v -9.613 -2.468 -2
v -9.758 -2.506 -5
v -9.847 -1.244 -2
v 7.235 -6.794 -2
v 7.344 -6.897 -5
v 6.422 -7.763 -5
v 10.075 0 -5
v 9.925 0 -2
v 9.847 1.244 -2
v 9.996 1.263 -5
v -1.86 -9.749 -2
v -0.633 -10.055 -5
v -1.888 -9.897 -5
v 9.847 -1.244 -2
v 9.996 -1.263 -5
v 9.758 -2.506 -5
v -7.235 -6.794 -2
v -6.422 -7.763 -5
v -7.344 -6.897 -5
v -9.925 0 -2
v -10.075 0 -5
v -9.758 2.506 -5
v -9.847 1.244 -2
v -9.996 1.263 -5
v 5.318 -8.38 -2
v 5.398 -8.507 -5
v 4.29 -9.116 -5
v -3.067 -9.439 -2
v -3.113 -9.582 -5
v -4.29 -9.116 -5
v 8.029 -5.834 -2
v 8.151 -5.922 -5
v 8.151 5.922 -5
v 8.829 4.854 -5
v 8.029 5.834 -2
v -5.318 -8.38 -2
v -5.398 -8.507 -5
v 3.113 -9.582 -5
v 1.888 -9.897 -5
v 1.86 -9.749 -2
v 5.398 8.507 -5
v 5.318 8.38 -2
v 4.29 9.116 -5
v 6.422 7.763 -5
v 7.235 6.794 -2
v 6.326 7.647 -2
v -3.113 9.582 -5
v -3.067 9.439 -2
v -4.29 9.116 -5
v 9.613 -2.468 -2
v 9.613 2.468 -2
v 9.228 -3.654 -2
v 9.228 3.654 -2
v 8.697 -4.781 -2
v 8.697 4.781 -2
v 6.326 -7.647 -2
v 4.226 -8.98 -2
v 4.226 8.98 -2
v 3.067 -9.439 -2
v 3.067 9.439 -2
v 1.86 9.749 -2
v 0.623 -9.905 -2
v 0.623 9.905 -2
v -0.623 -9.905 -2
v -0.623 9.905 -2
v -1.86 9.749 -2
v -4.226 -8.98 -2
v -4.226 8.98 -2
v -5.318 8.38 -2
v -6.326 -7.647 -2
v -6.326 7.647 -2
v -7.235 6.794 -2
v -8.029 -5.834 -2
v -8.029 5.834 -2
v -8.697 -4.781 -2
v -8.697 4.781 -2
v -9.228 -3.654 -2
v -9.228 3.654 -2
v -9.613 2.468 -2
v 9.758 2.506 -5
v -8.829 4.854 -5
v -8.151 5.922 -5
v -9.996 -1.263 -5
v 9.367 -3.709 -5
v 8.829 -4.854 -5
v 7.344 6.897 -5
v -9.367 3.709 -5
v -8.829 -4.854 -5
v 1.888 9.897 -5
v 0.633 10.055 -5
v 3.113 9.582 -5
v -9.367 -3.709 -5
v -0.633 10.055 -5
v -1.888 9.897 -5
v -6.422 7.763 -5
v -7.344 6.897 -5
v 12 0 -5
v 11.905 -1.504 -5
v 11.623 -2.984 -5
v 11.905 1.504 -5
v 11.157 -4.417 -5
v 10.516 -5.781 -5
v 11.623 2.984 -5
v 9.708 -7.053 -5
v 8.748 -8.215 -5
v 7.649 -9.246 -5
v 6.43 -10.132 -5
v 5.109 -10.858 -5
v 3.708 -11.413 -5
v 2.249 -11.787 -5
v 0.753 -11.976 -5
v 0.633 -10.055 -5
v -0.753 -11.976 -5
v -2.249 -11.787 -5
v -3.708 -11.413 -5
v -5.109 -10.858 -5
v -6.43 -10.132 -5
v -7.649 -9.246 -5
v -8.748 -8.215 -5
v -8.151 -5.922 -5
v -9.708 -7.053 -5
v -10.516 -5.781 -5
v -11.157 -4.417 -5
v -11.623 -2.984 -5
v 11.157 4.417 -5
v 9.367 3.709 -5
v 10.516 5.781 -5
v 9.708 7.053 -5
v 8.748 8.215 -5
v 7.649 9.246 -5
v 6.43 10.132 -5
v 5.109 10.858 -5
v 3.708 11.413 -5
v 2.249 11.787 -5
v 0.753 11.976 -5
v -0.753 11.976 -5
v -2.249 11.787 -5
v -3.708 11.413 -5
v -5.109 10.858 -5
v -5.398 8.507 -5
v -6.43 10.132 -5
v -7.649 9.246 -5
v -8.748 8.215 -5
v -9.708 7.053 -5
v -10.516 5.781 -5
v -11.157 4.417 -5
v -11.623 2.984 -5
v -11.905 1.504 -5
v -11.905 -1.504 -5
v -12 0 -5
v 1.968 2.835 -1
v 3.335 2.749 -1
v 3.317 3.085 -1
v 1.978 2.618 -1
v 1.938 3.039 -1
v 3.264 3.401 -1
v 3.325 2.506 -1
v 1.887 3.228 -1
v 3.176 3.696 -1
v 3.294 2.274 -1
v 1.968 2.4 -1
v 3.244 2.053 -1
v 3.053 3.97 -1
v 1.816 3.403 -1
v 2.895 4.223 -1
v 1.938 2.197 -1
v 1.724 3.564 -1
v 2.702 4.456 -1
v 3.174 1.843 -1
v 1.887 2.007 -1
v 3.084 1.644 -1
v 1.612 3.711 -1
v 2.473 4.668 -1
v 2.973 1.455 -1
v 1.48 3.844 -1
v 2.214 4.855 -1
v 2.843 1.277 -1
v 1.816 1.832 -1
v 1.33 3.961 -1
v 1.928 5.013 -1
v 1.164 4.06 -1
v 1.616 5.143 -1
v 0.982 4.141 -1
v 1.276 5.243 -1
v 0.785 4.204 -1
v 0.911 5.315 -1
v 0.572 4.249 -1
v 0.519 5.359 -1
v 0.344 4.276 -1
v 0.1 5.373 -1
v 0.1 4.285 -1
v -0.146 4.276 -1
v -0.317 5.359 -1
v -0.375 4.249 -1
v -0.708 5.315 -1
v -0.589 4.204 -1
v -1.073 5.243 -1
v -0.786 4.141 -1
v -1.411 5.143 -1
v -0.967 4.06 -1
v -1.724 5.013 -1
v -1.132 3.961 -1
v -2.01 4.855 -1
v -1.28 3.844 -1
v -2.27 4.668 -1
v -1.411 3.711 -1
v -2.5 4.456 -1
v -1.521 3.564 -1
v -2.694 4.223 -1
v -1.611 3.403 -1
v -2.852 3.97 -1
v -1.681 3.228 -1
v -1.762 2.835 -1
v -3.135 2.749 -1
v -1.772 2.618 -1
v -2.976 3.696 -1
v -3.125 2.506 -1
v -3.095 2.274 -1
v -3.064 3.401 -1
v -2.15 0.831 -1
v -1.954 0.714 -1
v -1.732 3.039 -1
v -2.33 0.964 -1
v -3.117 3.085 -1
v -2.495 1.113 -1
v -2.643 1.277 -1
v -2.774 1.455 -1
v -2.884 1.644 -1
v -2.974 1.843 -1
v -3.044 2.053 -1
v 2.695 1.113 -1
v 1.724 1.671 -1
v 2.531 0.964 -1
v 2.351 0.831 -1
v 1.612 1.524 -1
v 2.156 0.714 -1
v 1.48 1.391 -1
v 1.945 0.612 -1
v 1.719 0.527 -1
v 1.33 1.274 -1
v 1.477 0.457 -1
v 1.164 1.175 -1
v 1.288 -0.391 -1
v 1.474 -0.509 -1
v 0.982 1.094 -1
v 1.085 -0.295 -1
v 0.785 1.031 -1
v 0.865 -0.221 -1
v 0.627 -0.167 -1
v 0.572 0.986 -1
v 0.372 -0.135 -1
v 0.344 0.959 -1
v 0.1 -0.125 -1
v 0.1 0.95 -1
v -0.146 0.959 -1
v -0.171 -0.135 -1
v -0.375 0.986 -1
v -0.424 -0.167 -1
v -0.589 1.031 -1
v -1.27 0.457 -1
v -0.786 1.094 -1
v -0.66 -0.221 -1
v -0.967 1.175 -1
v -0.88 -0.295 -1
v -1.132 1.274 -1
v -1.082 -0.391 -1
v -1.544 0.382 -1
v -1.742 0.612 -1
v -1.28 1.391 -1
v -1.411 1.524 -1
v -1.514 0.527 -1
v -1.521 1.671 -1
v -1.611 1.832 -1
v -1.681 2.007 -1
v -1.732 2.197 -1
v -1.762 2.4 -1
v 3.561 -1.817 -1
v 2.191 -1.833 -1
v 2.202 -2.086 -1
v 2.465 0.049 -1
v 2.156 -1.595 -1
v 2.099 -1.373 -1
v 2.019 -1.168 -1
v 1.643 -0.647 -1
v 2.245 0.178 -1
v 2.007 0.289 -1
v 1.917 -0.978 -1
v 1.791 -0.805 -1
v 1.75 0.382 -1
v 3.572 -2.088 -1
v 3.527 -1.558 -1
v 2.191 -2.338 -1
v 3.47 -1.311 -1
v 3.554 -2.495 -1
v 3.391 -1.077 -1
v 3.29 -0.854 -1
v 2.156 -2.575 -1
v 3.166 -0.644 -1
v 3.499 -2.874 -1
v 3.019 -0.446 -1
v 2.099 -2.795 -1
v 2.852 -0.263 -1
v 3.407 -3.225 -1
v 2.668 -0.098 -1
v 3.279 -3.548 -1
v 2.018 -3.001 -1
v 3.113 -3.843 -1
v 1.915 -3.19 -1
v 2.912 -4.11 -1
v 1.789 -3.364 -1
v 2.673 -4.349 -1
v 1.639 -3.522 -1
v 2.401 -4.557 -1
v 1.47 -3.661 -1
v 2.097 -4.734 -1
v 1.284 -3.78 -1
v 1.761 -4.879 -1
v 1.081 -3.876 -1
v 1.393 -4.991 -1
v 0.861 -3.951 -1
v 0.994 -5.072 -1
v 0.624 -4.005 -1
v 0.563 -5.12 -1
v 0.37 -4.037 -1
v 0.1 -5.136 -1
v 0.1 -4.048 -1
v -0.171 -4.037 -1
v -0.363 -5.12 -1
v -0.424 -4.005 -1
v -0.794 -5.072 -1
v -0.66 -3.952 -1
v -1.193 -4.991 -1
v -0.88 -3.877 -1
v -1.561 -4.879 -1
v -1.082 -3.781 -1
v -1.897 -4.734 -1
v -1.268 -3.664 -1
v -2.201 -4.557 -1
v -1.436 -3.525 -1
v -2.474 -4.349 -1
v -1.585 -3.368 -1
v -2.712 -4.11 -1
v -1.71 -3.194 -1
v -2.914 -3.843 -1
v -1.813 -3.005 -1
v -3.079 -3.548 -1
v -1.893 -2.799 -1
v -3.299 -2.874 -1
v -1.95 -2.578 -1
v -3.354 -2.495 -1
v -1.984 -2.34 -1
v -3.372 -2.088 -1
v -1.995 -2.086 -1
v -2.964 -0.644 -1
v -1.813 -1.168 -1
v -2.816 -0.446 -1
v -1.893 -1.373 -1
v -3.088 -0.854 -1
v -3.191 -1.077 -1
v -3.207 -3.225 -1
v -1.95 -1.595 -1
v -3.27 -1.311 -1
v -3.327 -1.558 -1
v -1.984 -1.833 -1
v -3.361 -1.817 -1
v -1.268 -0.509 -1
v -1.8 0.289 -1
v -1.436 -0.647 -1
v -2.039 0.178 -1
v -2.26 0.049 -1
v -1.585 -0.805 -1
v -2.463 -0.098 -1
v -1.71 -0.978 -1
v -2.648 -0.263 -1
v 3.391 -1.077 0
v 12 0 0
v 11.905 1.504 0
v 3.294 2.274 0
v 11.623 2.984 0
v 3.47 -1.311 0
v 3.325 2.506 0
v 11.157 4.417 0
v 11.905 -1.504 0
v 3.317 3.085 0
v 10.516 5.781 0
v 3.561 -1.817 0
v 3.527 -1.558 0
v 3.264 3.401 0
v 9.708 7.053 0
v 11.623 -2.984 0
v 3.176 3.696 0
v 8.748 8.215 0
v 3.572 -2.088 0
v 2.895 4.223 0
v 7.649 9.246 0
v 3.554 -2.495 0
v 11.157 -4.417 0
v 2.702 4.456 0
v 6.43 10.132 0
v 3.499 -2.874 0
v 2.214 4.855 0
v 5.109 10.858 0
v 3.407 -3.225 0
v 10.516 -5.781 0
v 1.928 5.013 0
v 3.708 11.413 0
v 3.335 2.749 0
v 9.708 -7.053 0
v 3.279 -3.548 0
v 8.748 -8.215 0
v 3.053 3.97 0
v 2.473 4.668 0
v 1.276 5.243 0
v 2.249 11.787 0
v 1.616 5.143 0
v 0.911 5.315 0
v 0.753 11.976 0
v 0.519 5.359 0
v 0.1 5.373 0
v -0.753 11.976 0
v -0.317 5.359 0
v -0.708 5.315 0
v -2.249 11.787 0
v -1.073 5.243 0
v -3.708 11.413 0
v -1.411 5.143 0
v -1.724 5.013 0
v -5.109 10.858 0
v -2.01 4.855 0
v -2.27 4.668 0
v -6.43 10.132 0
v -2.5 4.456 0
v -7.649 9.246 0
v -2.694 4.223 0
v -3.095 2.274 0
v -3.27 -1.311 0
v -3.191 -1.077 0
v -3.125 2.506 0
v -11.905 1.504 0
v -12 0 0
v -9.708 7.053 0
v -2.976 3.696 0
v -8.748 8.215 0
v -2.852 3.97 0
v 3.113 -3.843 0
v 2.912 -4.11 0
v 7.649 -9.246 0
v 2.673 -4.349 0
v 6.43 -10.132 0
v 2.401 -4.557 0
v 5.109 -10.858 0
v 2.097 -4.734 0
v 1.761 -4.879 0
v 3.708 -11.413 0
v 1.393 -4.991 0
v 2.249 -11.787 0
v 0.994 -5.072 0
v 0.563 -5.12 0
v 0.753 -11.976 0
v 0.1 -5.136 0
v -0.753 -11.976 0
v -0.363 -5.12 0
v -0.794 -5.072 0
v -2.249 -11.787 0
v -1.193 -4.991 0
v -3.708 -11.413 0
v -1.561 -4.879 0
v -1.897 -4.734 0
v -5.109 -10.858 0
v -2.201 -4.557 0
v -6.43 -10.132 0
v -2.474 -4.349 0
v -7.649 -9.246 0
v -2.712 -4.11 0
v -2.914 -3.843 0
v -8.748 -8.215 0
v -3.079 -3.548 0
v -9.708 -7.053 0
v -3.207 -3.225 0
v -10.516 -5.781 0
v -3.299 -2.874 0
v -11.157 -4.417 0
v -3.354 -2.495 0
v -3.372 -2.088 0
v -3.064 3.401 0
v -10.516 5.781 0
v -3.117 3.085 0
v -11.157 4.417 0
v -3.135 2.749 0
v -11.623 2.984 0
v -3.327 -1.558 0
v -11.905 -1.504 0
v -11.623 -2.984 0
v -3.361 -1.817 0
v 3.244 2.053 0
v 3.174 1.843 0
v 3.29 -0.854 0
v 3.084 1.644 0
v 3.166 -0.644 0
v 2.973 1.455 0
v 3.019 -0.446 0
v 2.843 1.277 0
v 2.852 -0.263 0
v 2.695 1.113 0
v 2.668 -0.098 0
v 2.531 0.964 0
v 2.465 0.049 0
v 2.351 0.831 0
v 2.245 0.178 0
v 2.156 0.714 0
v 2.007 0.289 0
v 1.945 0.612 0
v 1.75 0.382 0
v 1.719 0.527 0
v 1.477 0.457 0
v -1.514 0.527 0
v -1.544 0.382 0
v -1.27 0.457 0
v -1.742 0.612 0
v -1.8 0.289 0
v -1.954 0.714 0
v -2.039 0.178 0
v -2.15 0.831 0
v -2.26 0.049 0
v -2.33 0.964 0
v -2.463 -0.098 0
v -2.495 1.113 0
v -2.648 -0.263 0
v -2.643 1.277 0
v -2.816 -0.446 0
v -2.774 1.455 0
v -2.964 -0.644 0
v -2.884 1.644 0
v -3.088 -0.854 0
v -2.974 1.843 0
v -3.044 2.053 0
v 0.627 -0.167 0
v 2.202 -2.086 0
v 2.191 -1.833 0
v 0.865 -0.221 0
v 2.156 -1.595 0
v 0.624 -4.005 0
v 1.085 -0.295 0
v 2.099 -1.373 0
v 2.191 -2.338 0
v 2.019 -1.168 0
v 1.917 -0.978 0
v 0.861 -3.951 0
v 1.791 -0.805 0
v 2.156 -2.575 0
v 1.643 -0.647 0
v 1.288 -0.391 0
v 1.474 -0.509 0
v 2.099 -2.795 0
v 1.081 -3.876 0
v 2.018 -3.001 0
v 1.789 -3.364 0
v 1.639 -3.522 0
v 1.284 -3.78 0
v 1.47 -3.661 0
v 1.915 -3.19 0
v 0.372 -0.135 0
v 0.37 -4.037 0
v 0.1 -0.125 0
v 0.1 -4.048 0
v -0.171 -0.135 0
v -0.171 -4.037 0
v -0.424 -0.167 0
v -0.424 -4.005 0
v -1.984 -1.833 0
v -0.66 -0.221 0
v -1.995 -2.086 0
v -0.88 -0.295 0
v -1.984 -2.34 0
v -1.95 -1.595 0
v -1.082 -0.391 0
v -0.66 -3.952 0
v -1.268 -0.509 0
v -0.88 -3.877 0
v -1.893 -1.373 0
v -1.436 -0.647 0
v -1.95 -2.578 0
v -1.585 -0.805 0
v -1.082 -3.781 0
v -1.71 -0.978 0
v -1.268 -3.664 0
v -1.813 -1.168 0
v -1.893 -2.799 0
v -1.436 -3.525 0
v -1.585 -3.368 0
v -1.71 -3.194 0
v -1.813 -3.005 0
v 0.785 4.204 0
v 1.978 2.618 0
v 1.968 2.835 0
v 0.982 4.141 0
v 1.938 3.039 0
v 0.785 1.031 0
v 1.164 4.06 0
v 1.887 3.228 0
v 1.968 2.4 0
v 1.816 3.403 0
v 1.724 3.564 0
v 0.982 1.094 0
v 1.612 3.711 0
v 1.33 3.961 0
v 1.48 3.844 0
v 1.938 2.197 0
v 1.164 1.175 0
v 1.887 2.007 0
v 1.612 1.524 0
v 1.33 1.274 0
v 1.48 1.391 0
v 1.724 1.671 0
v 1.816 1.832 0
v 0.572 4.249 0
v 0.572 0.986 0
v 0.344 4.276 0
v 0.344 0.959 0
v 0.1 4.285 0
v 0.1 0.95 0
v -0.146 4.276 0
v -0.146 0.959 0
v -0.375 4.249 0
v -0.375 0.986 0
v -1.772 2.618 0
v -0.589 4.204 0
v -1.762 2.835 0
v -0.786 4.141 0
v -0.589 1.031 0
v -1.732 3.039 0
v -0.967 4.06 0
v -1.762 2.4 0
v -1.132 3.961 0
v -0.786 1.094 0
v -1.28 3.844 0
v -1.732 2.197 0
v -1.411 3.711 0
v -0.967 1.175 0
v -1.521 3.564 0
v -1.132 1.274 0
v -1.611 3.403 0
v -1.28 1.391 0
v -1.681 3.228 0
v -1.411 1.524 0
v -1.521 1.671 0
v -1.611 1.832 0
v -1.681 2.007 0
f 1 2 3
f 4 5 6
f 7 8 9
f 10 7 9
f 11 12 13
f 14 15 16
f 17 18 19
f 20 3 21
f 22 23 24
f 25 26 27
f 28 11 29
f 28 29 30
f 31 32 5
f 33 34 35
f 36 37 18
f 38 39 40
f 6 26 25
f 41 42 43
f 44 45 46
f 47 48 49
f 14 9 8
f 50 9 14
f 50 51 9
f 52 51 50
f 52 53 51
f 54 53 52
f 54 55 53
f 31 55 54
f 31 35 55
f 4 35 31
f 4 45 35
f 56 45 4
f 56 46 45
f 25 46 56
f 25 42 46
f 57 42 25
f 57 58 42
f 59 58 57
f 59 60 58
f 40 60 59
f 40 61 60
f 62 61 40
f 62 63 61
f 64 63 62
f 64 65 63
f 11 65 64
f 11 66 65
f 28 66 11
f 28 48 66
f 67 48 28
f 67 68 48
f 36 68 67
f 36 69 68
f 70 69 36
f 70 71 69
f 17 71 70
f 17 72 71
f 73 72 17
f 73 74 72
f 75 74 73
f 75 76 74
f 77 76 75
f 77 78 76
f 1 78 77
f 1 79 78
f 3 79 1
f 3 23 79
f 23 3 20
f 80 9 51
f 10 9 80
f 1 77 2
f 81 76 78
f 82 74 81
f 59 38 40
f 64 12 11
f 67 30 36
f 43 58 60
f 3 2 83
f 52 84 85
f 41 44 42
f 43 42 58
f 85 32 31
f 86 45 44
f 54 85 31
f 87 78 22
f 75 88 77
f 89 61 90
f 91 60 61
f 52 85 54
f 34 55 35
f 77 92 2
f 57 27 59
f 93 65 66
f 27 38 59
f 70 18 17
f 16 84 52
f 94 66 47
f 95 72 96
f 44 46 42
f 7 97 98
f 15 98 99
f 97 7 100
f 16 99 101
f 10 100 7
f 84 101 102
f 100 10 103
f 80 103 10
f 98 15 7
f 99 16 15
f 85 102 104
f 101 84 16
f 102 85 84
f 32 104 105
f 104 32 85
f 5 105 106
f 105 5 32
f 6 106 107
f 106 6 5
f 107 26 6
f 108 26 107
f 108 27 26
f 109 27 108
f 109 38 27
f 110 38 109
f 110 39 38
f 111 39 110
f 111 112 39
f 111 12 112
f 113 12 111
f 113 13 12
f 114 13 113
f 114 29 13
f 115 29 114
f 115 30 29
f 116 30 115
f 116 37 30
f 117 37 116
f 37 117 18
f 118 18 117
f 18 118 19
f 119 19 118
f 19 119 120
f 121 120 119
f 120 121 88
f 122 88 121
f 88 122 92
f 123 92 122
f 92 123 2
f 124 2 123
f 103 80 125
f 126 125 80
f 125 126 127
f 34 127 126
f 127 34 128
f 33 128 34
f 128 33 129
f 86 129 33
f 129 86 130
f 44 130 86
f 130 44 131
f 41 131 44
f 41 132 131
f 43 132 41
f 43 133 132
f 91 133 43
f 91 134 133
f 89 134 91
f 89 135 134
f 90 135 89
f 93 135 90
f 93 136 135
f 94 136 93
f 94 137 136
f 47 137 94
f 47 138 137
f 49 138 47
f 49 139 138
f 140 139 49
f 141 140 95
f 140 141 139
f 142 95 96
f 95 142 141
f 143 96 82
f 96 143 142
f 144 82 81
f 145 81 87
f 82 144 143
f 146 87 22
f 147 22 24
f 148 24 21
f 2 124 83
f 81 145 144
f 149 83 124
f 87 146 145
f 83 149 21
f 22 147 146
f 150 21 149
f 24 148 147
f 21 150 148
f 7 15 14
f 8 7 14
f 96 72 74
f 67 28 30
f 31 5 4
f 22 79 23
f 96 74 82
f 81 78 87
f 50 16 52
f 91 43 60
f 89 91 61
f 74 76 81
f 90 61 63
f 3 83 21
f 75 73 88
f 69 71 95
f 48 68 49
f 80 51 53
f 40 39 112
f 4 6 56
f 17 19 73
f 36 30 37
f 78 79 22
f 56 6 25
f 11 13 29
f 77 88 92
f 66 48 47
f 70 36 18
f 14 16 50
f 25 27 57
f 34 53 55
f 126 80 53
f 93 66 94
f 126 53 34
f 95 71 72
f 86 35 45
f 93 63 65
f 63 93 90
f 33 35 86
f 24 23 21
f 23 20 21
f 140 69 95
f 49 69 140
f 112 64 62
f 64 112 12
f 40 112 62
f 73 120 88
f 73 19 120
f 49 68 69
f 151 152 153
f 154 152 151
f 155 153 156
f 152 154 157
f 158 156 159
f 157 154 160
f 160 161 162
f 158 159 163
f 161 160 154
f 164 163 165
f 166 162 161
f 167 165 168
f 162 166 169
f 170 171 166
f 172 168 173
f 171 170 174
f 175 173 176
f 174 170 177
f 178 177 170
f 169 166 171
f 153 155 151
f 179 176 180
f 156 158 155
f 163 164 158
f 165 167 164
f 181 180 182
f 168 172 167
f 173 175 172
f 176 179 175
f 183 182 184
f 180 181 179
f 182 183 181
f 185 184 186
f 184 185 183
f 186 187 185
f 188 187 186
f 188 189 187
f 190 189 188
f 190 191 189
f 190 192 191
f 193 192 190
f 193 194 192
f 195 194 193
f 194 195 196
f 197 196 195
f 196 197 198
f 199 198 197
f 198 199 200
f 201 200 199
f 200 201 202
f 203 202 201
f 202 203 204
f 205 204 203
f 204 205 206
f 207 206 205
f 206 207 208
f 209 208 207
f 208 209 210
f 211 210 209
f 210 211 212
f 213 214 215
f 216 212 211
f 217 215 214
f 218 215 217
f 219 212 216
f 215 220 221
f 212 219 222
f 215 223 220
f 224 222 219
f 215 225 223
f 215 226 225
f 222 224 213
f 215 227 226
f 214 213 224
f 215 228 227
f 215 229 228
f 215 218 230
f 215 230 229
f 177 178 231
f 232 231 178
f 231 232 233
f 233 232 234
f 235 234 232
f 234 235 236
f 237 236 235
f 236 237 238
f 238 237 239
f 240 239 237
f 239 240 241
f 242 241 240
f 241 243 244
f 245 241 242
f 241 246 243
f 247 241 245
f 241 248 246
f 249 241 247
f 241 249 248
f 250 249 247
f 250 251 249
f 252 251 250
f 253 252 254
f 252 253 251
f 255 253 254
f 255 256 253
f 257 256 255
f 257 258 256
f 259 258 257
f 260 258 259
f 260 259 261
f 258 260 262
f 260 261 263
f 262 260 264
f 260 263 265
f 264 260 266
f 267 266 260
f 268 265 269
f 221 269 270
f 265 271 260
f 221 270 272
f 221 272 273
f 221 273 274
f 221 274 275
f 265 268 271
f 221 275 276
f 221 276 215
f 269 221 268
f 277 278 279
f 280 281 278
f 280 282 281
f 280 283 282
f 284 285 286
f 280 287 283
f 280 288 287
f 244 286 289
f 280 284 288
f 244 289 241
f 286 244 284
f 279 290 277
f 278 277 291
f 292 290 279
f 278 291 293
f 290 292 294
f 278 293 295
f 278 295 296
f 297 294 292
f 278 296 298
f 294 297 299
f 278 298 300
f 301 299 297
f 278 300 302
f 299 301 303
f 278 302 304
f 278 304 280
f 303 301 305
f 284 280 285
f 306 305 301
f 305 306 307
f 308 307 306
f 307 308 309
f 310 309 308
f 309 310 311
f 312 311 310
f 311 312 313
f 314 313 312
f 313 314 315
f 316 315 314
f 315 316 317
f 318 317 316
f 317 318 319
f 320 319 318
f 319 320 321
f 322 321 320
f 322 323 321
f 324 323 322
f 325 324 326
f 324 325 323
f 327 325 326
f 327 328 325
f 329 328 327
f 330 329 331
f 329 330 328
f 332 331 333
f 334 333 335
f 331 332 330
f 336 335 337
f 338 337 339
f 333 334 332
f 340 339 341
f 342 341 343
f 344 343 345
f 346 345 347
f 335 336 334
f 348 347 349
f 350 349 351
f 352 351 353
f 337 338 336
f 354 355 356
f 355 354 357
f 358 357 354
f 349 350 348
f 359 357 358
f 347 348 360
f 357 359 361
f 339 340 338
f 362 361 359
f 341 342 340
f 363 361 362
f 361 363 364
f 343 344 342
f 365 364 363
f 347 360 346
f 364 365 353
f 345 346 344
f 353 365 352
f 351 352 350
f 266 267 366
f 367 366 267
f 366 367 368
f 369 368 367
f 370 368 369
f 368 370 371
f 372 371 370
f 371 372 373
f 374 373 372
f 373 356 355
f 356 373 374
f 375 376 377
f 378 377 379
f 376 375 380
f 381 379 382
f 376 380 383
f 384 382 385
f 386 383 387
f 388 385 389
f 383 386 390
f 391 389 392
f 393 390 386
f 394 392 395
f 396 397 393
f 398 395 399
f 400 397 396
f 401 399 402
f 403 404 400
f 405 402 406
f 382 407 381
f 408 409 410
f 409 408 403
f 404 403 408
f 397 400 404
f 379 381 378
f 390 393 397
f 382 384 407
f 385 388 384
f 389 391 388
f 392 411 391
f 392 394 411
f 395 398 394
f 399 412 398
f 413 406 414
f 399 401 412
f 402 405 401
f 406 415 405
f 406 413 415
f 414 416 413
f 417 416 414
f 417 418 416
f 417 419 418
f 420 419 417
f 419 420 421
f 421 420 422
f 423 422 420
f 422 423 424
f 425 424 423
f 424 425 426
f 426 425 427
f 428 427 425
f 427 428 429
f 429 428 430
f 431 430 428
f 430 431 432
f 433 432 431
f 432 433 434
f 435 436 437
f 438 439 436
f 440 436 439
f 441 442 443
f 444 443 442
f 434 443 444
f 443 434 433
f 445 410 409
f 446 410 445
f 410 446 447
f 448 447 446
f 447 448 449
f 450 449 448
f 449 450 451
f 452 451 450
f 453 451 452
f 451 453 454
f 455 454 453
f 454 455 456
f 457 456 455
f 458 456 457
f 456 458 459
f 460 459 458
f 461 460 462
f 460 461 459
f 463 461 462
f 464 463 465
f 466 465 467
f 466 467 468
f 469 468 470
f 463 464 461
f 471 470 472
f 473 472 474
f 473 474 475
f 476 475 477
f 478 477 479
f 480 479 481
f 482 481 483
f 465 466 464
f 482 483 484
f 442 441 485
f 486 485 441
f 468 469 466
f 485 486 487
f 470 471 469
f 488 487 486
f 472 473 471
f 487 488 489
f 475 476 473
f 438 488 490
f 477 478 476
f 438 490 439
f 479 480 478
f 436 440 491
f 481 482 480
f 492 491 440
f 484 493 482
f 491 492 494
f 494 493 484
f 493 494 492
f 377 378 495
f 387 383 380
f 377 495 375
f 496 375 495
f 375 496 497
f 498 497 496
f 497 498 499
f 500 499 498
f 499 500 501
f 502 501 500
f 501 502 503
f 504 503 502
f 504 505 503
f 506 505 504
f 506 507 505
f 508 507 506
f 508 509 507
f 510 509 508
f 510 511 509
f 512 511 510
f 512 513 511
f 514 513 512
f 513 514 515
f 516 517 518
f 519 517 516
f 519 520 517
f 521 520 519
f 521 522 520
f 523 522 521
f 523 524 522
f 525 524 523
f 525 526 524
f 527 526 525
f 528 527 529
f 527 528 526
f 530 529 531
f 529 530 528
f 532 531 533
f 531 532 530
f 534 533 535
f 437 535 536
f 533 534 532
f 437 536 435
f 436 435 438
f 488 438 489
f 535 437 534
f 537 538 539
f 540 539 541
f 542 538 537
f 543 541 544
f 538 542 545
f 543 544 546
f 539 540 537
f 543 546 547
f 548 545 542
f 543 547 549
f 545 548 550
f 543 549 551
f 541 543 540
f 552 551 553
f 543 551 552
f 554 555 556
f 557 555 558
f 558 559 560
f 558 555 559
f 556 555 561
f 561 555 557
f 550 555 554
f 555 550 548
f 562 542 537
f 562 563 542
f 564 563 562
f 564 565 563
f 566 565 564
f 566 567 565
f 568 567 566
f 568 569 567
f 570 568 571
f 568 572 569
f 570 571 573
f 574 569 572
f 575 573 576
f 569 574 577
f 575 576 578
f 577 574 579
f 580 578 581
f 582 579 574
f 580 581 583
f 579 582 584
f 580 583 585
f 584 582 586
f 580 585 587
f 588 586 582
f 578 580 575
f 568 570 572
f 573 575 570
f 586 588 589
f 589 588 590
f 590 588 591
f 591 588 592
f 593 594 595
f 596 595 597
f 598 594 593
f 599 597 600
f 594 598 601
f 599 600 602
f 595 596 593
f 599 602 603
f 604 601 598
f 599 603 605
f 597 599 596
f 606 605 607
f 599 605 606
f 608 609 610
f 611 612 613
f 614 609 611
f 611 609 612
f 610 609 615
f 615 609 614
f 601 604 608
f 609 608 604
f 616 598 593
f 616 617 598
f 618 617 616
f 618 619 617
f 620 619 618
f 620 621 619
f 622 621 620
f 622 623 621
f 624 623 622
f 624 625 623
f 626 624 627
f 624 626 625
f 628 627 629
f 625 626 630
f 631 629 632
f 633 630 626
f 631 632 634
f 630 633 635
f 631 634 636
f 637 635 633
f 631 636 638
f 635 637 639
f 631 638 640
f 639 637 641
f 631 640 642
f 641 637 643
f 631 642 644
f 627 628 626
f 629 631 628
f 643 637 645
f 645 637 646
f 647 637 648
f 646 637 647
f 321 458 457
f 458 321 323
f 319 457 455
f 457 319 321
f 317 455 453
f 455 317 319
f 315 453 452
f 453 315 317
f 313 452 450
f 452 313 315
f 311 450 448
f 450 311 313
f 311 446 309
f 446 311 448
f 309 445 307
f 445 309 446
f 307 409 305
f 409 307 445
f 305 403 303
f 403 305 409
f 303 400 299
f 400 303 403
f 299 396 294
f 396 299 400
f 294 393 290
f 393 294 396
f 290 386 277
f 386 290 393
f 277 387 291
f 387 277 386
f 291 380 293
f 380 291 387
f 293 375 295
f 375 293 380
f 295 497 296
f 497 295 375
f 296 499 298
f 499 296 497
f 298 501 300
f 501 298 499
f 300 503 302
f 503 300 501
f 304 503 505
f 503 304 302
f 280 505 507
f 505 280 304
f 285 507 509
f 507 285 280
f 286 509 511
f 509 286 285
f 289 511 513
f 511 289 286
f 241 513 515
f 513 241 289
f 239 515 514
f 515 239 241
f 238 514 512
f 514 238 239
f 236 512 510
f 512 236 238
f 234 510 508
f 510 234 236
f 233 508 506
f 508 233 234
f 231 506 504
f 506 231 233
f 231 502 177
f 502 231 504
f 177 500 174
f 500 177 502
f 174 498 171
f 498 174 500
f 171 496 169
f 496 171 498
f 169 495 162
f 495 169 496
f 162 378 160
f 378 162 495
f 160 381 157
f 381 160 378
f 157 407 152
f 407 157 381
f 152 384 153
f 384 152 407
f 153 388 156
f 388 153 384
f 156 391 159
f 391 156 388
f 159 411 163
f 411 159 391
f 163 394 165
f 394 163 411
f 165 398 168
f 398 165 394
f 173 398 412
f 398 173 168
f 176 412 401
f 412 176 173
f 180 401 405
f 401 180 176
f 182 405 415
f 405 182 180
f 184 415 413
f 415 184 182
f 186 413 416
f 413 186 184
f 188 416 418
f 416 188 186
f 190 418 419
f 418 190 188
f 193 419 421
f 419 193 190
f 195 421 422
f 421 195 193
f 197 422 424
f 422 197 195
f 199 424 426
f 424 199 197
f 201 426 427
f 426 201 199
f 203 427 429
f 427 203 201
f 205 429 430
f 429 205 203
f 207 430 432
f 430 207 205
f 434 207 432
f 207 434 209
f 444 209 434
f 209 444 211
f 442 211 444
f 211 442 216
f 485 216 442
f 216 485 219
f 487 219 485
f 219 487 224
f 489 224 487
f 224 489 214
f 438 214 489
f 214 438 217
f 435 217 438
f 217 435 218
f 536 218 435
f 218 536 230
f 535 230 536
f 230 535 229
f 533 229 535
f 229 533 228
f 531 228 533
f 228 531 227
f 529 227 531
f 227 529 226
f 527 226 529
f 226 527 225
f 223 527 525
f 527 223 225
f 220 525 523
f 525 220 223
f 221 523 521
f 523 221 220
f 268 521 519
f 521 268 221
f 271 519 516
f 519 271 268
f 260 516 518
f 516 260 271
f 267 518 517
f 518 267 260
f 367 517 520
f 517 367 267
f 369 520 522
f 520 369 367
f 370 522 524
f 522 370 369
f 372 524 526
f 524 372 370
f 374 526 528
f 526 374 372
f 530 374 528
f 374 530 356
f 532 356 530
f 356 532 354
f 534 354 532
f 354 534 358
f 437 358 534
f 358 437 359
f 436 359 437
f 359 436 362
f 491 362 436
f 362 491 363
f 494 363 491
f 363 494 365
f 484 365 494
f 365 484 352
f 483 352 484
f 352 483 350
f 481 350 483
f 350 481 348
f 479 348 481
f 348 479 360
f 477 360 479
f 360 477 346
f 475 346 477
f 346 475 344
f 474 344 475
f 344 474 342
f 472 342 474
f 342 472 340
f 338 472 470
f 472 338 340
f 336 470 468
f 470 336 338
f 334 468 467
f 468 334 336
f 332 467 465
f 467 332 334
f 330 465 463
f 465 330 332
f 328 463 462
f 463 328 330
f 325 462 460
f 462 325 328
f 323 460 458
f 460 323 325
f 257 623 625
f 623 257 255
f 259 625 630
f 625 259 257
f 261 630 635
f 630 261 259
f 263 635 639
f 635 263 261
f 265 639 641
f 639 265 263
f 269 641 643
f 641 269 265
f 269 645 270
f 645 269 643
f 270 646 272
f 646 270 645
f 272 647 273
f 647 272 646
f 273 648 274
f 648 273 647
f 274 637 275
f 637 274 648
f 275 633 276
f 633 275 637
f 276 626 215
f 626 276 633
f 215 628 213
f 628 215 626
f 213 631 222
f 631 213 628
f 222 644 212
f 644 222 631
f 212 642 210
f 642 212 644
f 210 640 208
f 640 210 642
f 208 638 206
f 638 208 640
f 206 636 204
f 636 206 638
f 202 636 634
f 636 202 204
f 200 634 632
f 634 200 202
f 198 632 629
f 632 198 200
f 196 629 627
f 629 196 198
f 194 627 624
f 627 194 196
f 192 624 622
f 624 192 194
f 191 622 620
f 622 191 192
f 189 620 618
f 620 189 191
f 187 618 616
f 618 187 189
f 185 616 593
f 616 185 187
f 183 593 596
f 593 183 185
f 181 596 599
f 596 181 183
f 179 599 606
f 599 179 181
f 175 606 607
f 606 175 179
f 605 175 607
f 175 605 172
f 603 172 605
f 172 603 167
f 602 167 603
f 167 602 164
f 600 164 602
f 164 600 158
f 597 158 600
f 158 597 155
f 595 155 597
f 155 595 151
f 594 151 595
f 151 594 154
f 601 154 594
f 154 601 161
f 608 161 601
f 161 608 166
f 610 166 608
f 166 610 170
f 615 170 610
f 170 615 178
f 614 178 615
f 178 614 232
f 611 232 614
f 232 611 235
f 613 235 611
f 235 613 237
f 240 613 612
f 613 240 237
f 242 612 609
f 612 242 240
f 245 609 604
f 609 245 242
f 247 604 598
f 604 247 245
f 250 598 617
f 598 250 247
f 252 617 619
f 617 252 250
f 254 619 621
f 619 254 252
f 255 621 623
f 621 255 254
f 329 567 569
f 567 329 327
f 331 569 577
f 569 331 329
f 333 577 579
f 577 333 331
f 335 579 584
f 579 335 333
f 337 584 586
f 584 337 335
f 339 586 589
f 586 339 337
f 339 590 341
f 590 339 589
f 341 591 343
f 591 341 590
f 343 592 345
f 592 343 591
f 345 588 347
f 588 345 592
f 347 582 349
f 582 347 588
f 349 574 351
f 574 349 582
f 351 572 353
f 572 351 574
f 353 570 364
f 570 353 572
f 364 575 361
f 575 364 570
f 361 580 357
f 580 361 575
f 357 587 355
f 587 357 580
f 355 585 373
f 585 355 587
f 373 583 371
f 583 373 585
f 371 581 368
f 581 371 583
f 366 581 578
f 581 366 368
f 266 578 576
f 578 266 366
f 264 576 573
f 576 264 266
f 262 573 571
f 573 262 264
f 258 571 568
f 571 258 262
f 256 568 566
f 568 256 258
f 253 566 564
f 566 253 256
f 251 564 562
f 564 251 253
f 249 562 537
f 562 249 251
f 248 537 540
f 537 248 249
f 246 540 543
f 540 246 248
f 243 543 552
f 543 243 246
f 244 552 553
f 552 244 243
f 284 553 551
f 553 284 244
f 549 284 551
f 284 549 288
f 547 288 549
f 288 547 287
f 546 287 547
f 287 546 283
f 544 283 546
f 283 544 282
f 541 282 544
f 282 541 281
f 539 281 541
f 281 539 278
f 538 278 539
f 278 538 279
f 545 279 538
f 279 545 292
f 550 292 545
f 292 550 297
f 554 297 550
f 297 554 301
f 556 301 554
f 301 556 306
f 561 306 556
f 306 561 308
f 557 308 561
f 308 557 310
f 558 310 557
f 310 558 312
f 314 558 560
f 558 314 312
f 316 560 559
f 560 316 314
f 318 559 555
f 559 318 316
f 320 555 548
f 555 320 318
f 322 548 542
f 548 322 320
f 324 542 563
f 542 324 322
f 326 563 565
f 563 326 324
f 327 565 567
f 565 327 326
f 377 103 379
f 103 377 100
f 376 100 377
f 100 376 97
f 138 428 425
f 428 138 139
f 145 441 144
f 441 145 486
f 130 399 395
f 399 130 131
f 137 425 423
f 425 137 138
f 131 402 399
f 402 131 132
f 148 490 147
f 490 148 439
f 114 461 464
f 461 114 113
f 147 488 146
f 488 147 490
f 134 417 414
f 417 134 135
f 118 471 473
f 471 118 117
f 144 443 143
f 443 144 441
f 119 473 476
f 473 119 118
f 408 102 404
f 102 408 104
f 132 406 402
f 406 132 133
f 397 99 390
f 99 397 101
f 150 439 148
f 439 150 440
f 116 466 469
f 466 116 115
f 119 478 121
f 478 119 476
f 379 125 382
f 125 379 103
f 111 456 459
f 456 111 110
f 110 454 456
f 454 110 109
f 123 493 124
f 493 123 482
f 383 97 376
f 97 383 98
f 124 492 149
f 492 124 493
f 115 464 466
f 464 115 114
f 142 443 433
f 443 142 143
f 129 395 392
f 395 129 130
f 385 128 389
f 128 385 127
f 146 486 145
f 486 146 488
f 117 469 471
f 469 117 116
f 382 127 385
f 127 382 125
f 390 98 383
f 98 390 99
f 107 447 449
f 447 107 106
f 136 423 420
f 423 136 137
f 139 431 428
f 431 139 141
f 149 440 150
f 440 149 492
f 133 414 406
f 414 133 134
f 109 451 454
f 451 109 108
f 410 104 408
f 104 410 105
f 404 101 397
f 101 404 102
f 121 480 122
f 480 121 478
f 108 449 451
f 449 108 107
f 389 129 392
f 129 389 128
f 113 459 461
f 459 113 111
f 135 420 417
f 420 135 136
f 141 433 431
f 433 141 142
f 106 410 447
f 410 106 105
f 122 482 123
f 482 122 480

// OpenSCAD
$fn = 50;

difference() {
	union() {
		translate(v = [0, 0, -5.0]) {
			cylinder(h = 5, r = 12.0);
		}
	}
	union() {
		#translate(v = [0, 0, -5.0]) {
			cylinder(h = 3, r1 = 10.075, r2 = 9.925);
		}
		translate(v = [0, 0, -1]) {
			linear_extrude(height = 1) {
				text(font = "Impact", halign = "center", size = 10, text = "8", valign = "center");
			}
		}
	}
}
